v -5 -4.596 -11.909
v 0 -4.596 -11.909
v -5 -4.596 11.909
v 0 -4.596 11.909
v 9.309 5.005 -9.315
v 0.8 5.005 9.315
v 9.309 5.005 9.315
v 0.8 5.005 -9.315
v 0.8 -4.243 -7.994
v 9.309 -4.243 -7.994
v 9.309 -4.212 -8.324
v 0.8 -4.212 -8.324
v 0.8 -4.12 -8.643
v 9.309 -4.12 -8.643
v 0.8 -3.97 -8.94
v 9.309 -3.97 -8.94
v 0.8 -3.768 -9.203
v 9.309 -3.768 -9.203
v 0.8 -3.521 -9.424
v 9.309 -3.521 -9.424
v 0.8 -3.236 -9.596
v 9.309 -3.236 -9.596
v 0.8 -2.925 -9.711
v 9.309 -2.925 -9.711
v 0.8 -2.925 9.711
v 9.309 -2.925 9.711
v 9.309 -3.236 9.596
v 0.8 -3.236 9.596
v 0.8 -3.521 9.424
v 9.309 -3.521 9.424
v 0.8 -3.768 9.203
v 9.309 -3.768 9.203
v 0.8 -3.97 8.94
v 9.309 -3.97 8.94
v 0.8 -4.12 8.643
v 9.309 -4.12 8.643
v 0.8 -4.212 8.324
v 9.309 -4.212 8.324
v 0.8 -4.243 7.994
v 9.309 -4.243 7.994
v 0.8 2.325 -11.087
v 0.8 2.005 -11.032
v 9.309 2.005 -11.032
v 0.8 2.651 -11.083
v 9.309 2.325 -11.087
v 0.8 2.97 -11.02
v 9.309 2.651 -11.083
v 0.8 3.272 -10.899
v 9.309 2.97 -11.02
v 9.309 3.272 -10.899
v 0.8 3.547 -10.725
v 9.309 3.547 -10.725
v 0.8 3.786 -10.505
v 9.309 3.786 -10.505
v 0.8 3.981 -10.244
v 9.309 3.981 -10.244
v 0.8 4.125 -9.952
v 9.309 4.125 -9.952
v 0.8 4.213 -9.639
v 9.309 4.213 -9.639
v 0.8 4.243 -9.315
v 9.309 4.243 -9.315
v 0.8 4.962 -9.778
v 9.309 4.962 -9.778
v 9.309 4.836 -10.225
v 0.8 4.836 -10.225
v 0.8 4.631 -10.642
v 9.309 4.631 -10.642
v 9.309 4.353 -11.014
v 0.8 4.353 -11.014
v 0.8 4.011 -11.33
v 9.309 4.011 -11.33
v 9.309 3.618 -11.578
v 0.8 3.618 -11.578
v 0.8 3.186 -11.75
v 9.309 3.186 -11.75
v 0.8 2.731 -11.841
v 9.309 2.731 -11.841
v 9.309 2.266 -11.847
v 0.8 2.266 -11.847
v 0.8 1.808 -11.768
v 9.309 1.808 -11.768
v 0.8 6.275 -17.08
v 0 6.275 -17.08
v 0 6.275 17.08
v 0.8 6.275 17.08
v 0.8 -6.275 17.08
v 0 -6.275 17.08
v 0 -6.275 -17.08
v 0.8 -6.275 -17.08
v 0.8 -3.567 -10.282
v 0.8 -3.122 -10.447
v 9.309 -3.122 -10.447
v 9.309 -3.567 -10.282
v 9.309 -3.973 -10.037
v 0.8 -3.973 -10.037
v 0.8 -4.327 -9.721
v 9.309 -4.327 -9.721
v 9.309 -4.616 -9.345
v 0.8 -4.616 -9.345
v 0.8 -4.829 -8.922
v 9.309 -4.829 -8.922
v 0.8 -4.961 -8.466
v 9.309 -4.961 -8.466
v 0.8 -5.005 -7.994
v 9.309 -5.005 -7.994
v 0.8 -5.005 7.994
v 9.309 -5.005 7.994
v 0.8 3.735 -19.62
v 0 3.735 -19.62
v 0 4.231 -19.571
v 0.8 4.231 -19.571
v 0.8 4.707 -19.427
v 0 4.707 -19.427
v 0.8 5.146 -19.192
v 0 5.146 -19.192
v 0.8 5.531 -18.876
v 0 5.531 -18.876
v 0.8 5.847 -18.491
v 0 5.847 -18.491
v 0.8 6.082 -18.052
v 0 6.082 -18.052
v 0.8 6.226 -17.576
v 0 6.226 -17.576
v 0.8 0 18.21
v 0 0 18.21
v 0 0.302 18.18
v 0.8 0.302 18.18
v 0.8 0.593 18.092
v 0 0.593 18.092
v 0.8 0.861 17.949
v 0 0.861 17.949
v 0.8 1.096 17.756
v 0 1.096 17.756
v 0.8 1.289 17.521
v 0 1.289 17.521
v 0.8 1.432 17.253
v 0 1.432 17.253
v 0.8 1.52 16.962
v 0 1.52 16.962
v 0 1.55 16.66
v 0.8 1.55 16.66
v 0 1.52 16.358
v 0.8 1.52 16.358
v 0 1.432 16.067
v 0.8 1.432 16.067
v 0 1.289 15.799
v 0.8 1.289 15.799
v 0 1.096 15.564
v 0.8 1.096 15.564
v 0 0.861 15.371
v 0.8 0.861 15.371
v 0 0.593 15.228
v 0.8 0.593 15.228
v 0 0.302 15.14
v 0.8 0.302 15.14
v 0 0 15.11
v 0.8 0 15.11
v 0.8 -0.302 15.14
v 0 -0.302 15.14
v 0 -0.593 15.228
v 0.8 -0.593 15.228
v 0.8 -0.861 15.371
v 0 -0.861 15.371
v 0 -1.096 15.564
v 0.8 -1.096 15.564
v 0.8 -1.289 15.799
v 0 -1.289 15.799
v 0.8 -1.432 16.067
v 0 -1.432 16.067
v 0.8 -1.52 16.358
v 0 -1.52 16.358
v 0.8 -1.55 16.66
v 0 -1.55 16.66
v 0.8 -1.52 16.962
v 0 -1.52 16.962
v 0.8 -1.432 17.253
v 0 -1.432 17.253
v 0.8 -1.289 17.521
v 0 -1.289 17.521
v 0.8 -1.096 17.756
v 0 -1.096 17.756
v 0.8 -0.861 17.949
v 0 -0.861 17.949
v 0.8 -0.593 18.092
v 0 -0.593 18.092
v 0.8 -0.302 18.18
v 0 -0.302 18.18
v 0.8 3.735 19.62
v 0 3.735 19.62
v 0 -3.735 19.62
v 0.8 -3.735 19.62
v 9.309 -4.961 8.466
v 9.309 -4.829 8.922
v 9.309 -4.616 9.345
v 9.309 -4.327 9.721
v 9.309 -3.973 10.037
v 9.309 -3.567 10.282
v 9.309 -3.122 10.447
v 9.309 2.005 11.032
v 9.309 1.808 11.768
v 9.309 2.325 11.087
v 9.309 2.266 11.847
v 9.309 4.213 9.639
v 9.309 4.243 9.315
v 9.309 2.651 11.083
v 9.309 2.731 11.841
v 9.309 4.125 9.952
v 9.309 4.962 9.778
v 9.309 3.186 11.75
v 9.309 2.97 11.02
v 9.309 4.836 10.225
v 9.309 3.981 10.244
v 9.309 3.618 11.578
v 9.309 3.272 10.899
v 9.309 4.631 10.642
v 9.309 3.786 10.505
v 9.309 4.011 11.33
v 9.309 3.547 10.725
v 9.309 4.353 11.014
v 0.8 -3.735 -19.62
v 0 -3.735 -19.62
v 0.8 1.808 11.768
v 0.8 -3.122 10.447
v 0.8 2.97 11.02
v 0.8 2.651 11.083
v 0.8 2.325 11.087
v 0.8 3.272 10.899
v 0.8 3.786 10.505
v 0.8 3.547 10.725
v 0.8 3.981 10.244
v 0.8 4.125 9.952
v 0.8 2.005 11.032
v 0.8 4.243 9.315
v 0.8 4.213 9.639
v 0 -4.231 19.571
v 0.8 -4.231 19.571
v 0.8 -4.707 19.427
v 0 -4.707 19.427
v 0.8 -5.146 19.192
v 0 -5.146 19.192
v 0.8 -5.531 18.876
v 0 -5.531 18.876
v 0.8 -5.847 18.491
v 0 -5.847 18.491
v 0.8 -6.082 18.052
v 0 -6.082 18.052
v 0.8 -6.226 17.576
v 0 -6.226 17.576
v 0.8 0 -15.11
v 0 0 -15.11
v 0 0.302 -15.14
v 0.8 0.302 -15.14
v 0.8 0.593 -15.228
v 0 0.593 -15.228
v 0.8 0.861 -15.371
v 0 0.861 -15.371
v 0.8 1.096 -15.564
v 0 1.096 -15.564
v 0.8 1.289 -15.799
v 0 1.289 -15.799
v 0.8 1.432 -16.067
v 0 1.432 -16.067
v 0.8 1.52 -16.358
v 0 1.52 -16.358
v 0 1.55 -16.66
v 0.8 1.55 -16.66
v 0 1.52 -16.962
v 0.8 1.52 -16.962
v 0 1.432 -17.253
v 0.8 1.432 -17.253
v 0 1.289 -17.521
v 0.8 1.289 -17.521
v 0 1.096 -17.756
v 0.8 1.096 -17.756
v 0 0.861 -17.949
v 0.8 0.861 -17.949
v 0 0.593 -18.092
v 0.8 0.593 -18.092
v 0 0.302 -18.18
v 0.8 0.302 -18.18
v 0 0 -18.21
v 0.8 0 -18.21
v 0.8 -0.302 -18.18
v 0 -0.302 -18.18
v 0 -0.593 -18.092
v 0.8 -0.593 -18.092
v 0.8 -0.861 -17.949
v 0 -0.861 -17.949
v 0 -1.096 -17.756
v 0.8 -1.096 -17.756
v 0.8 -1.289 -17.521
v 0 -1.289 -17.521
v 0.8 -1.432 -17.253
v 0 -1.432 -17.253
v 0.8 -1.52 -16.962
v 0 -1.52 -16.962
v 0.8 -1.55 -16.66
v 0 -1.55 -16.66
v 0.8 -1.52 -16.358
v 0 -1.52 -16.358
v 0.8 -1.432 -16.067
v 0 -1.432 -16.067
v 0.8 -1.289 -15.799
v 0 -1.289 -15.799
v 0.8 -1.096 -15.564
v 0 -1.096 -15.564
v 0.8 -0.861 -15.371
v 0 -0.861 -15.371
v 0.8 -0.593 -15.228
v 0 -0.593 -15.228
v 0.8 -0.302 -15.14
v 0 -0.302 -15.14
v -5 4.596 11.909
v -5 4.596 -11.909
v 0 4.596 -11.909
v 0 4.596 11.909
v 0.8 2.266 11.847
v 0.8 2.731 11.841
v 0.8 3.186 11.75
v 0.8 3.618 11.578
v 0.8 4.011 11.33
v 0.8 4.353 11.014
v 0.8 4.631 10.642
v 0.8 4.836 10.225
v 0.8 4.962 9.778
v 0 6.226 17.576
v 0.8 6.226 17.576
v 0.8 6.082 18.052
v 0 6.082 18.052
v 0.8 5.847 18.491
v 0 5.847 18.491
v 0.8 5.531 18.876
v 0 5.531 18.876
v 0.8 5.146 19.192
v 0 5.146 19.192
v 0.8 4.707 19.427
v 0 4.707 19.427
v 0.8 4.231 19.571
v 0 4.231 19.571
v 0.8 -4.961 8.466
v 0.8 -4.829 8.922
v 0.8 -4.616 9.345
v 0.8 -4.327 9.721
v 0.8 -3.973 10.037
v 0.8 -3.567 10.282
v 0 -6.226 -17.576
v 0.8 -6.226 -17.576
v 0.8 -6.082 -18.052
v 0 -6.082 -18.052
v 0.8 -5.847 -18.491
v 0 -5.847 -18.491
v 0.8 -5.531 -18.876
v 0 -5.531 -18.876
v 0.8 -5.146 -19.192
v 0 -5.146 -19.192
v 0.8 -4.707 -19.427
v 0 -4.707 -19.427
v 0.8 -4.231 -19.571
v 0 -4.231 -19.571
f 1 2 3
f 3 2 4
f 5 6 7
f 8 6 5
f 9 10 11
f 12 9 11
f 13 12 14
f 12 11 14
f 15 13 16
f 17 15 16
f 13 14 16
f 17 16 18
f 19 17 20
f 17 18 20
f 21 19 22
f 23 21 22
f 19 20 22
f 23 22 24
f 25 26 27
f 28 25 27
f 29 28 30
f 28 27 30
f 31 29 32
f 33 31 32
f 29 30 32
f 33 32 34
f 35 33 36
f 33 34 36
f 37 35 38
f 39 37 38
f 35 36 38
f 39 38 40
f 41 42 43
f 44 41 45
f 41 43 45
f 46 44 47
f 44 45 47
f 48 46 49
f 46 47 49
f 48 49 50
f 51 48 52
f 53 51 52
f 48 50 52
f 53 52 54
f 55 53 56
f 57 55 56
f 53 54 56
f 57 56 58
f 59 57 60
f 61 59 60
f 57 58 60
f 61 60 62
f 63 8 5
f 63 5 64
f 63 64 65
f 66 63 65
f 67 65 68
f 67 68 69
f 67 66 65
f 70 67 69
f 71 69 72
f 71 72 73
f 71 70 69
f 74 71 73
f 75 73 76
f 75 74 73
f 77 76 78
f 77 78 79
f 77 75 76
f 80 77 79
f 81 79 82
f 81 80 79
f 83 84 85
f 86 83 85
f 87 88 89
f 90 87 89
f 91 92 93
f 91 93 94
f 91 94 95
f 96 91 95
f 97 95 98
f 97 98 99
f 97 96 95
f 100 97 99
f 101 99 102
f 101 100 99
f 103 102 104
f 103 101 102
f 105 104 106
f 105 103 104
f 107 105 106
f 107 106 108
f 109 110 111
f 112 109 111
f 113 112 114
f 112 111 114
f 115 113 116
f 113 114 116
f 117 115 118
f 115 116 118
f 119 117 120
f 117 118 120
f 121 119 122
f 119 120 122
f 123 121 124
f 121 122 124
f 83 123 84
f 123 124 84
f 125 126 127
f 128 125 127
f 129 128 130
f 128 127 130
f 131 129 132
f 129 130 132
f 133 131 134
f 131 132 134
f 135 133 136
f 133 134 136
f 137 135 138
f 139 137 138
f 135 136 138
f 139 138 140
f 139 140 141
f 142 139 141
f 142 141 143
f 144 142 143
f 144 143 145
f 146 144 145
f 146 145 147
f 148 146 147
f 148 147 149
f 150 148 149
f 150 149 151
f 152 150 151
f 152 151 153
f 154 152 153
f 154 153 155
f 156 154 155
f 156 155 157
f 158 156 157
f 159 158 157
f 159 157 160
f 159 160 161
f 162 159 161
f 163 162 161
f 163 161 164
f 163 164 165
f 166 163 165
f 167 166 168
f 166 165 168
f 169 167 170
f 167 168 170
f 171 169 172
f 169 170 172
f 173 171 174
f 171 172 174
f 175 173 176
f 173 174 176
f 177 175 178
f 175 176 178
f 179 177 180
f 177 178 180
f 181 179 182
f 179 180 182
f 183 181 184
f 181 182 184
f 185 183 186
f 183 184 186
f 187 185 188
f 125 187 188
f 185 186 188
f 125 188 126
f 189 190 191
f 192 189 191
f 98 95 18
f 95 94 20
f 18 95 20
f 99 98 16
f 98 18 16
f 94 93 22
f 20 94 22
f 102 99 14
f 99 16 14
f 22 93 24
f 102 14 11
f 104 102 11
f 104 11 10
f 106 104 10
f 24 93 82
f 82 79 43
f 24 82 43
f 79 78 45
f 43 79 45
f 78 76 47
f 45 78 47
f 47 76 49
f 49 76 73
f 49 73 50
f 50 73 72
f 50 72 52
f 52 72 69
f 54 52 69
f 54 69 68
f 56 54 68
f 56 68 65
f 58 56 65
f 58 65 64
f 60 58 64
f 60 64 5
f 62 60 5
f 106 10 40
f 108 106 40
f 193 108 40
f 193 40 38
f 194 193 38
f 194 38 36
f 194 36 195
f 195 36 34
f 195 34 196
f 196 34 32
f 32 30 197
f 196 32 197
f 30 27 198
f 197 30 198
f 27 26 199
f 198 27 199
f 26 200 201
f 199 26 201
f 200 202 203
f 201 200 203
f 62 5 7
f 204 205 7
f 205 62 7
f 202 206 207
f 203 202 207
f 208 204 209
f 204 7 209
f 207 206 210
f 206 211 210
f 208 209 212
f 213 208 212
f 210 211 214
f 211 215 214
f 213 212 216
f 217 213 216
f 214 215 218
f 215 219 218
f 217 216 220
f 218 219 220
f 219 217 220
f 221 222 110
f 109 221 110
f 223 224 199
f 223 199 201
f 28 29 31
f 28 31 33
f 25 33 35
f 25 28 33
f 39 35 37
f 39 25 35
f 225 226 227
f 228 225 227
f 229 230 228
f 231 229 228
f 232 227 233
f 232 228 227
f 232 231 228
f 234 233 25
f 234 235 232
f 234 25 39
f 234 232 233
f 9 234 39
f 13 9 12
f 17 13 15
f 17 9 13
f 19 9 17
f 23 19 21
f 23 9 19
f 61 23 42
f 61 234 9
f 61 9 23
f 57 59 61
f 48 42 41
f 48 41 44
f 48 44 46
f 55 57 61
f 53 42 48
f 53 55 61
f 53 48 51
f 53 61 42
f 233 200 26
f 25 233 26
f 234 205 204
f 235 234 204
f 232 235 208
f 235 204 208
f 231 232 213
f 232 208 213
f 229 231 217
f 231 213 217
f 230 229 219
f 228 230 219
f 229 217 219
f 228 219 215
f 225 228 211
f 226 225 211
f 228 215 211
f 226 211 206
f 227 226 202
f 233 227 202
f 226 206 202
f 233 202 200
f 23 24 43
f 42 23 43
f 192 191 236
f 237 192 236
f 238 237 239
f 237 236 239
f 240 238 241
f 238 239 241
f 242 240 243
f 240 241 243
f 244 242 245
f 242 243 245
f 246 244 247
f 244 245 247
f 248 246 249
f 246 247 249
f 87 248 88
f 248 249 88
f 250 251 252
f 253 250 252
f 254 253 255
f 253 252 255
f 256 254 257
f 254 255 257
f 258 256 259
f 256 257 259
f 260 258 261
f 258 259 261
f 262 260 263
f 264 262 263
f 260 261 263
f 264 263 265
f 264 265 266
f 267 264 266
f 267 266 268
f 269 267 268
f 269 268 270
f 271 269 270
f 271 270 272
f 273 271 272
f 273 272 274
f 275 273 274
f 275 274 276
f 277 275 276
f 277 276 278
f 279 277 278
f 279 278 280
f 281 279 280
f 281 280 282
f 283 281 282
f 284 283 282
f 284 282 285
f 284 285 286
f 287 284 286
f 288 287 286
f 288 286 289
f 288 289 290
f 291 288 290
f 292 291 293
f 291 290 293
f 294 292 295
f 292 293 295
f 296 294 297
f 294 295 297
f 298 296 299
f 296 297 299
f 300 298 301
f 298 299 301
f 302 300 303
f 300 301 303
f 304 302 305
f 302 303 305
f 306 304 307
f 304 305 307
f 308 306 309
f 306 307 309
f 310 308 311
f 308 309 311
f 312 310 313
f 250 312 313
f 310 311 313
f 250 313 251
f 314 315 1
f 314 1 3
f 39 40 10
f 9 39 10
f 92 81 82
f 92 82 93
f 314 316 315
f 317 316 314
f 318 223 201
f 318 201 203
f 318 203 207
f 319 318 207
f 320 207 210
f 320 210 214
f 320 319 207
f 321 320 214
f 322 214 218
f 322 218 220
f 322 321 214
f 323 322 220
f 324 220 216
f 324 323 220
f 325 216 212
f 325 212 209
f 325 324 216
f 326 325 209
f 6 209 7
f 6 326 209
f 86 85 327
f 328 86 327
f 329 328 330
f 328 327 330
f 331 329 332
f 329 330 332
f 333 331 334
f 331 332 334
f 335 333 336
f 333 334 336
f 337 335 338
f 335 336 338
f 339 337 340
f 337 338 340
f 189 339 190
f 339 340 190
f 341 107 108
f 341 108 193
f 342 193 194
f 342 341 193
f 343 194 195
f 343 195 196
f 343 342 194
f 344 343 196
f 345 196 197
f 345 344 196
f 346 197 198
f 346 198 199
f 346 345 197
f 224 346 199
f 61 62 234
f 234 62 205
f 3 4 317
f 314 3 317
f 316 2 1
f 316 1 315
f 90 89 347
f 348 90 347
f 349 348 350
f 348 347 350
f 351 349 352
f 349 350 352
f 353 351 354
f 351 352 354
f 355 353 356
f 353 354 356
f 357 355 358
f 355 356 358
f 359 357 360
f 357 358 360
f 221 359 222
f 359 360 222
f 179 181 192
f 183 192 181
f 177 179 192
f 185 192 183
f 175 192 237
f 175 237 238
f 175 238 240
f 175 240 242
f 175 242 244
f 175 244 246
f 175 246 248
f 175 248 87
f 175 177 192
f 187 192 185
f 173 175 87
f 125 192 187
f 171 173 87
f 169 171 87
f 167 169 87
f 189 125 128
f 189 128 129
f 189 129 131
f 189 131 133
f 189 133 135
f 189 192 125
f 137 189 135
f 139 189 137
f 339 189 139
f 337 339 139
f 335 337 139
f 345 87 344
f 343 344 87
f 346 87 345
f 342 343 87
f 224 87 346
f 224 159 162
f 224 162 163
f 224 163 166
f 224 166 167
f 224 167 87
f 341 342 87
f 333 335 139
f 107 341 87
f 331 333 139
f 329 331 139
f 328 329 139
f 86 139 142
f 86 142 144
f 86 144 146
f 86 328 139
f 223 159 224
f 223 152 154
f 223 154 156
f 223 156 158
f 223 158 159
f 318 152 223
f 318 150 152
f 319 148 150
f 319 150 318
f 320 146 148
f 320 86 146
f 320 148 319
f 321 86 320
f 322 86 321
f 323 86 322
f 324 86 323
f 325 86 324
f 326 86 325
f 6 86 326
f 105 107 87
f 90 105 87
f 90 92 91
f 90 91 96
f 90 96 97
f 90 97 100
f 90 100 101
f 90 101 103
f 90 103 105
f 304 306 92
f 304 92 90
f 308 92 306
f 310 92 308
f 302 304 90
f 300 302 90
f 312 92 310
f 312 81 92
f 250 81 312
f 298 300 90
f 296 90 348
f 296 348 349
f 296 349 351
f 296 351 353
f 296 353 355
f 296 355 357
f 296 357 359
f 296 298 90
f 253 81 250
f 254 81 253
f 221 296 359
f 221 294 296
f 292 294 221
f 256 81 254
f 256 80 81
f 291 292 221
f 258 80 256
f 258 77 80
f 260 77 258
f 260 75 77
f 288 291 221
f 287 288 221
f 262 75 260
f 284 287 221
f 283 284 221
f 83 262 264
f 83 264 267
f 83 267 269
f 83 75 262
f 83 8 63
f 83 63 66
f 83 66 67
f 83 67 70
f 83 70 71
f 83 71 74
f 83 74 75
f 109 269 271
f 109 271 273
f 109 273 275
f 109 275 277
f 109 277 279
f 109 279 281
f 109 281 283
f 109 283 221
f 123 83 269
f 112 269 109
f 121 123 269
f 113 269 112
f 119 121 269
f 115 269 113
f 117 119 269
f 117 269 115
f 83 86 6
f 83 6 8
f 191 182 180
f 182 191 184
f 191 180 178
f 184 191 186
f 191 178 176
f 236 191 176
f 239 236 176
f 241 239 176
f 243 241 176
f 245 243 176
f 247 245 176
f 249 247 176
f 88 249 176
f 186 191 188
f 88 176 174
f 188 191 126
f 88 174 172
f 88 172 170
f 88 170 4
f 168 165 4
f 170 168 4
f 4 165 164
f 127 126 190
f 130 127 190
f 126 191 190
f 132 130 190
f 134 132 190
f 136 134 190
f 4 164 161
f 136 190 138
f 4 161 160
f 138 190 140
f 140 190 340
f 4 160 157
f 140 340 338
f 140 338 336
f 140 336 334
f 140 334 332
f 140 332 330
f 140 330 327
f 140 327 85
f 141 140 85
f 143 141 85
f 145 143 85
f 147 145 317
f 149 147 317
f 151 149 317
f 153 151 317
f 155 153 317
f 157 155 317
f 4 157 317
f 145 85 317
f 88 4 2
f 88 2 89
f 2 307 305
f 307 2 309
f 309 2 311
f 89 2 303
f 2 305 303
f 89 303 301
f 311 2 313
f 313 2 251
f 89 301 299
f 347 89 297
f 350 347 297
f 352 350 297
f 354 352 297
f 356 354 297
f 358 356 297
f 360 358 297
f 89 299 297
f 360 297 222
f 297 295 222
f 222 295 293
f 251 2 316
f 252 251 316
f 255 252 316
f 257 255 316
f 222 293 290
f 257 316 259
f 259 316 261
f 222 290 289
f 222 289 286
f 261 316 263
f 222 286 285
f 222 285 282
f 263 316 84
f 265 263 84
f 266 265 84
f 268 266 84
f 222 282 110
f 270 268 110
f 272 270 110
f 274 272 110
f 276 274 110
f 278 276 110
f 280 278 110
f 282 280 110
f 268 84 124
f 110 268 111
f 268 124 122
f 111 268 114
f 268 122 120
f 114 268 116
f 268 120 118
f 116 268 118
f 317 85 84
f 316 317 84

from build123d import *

# Parameters (mm, degrees)
BOSS_EXTRUDE1_DEPTH      = 0.8
BOSS_EXTRUDE2_DEPTH      = 8.509
CUT_EXTRUDE1_DEPTH       = 8.509
X_0_397_DIAMETER_HOLE1_D = 3.099999896
SKETCH8_W                = 23.81809924
SKETCH8_H                = 9.191548364
BOSS_EXTRUDE4_DEPTH      = 5


with BuildPart() as part:
    # Sketch1 → Boss-Extrude1 (new body)
    with BuildSketch(Plane(origin=(0, 0, 0), x_dir=(0, 0, -1), z_dir=(1, 0, 0))):
        with BuildLine():
            Line((-17.08, -6.275), (17.08, -6.275))
            ThreePointArc((17.08, -6.275), (18.876051224, -5.531051224), (19.62, -3.735))
            Line((19.62, -3.735), (19.62, 3.735))
            ThreePointArc((19.62, 3.735), (18.876051224, 5.531051224), (17.08, 6.275))
            Line((17.08, 6.275), (-17.08, 6.275))
            ThreePointArc((-17.08, 6.275), (-18.876051224, 5.531051224), (-19.62, 3.735))
            Line((-19.62, 3.735), (-19.62, -3.735))
            ThreePointArc((-19.62, -3.735), (-18.876051224, -5.531051224), (-17.08, -6.275))
        make_face()
    extrude(amount=BOSS_EXTRUDE1_DEPTH)

    # Sketch2 → Boss-Extrude2 (add)
    with BuildSketch(Plane(origin=(0.8, 0, 0), x_dir=(0, 0, -1), z_dir=(1, 0, 0))):
        with BuildLine():
            Line((-9.314807553, 5.005), (9.314807553, 5.005))
            ThreePointArc((9.314807553, 5.005), (11.329925037, 4.01125403), (11.768259152, 1.807599625))
            Line((11.768259152, 1.807599625), (10.447269633, -3.122400375))
            ThreePointArc((10.447269633, -3.122400375), (9.540072064, -4.480117484), (7.993818034, -5.005))
            Line((7.993818034, -5.005), (-7.993818034, -5.005))
            ThreePointArc((-7.993818034, -5.005), (-9.540072064, -4.480117484), (-10.447269633, -3.122400375))
            Line((-10.447269633, -3.122400375), (-11.768259152, 1.807599625))
            ThreePointArc((-11.768259152, 1.807599625), (-11.329925037, 4.01125403), (-9.314807553, 5.005))
        make_face()
    extrude(amount=BOSS_EXTRUDE2_DEPTH)

    # Sketch3 → Cut-Extrude1 (cut)
    with BuildSketch(Plane(origin=(9.309, 0, 0), x_dir=(0, 0, -1), z_dir=(1, 0, 0))):
        with BuildLine():
            Line((-11.032223672, 2.004819738), (-9.711234153, -2.925180262))
            ThreePointArc((-9.711234153, -2.925180262), (-9.076195855, -3.875582239), (-7.993818034, -4.243))
            Line((-7.993818034, -4.243), (7.993818034, -4.243))
            ThreePointArc((7.993818034, -4.243), (9.076195855, -3.875582239), (9.711234153, -2.925180262))
            Line((9.711234153, -2.925180262), (11.032223672, 2.004819738))
            ThreePointArc((11.032223672, 2.004819738), (10.725389792, 3.547377821), (9.314807553, 4.243))
            Line((9.314807553, 4.243), (-9.314807553, 4.243))
            ThreePointArc((-9.314807553, 4.243), (-10.725389792, 3.547377821), (-11.032223672, 2.004819738))
        make_face()
    extrude(amount=-CUT_EXTRUDE1_DEPTH, mode=Mode.SUBTRACT)

    # X (0.397) Diameter Hole1 (through all)
    with Locations(Plane(origin=(0.8, 0, 0), x_dir=(0, 0, -1), z_dir=(1, 0, 0))):
        with Locations((-16.66, 0), (16.66, 0)):
            Hole(X_0_397_DIAMETER_HOLE1_D / 2)

    # Sketch8 → Boss-Extrude4 (add)
    with BuildSketch(Plane.ZY):
        Rectangle(SKETCH8_W, SKETCH8_H)
    extrude(amount=BOSS_EXTRUDE4_DEPTH)


solid = part.part
